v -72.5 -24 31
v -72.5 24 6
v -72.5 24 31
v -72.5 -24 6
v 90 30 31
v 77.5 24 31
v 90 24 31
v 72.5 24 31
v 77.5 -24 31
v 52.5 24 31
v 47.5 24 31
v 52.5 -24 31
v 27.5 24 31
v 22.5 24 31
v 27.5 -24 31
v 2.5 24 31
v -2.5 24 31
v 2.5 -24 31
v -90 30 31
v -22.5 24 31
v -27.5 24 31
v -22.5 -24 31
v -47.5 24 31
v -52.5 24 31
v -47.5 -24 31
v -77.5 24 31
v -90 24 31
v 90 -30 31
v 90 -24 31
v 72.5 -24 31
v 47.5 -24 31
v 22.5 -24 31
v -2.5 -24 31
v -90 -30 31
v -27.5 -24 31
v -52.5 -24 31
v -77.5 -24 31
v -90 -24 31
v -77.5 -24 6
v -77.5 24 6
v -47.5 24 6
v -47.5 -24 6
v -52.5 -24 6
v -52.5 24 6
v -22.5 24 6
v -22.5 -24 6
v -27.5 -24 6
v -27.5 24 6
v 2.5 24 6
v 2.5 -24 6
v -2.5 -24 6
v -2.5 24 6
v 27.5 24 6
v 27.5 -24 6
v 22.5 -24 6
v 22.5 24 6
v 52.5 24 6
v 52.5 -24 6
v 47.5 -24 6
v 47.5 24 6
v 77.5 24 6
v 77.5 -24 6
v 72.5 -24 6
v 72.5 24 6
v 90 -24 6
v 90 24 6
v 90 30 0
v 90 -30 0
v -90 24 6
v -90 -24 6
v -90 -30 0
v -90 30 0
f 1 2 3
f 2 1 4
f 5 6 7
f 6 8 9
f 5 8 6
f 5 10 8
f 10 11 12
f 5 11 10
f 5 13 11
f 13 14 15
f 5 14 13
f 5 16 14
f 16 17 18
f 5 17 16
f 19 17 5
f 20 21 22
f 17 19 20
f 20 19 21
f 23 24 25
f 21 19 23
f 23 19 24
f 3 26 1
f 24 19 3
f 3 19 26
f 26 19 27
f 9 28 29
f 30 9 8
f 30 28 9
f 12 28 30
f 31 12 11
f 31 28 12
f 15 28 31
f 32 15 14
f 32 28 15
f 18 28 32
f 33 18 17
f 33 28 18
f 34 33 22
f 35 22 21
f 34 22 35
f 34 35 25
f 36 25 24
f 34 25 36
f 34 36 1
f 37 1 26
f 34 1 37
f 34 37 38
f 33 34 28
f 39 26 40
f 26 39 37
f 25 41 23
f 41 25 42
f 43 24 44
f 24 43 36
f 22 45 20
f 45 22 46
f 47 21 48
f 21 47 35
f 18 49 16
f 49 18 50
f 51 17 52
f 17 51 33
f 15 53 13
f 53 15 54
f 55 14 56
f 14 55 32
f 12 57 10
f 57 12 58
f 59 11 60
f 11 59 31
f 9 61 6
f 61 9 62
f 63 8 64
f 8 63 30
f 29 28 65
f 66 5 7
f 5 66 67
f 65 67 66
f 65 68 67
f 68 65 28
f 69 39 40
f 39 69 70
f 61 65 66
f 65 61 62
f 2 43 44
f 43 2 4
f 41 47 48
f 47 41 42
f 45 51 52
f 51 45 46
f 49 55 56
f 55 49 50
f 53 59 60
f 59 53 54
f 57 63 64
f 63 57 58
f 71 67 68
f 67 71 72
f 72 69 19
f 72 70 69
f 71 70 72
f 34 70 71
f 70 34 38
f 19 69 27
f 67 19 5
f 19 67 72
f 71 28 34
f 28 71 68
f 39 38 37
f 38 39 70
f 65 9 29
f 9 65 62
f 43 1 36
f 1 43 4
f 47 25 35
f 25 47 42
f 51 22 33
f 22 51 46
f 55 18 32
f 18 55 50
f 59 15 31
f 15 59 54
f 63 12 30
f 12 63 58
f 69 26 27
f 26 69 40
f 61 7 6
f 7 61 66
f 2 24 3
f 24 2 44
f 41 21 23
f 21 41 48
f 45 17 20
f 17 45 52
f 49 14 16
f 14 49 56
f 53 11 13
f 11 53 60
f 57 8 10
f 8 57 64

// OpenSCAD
$fn = 32;

// ----------------------------------------------------------------------
// Rib frame 180 x 60 x 31
// 7 ribs at 25 mm pitch
// ----------------------------------------------------------------------

// --- parameters (mm) ---
frame = [180, 60, 6];  // base plate size (x, y, z)
rail_w = 6;            // side rail width
ribs = 7;              // number of ribs
rib_t = 5;             // rib thickness
rib_h = 25;            // rib height above the base plate
pitch = 25;            // pitch between rib centres

// --- derived feature positions (mm) ---
span = (ribs - 1) * pitch;          // = 150   distance between the outer ribs
origin_x = -span / 2;               // = -75   X of the first rib
rib_len = frame[1] - 2 * rail_w + 2;  // = 50   rib length, 1 mm into each rail
feature_centers = [
  [origin_x + 0 * pitch, 0],
  [origin_x + 1 * pitch, 0],
  [origin_x + 2 * pitch, 0],
  [origin_x + 3 * pitch, 0],
  [origin_x + 4 * pitch, 0],
  [origin_x + 5 * pitch, 0],
  [origin_x + 6 * pitch, 0]
];   // rib centre line, drives the rib loop

// base plate, two side rails, then the ribs read straight off feature_centers
union() {
  translate([-frame[0] / 2, -frame[1] / 2, 0]) cube(frame);
  translate([-frame[0] / 2, -frame[1] / 2, 0]) cube([frame[0], rail_w, frame[2] + rib_h]);
  translate([-frame[0] / 2, frame[1] / 2 - rail_w, 0]) cube([frame[0], rail_w, frame[2] + rib_h]);
  for (centre = feature_centers)
    translate([centre[0] - rib_t / 2, centre[1] - rib_len / 2, frame[2] - 1])
      cube([rib_t, rib_len, rib_h + 1]);
}
